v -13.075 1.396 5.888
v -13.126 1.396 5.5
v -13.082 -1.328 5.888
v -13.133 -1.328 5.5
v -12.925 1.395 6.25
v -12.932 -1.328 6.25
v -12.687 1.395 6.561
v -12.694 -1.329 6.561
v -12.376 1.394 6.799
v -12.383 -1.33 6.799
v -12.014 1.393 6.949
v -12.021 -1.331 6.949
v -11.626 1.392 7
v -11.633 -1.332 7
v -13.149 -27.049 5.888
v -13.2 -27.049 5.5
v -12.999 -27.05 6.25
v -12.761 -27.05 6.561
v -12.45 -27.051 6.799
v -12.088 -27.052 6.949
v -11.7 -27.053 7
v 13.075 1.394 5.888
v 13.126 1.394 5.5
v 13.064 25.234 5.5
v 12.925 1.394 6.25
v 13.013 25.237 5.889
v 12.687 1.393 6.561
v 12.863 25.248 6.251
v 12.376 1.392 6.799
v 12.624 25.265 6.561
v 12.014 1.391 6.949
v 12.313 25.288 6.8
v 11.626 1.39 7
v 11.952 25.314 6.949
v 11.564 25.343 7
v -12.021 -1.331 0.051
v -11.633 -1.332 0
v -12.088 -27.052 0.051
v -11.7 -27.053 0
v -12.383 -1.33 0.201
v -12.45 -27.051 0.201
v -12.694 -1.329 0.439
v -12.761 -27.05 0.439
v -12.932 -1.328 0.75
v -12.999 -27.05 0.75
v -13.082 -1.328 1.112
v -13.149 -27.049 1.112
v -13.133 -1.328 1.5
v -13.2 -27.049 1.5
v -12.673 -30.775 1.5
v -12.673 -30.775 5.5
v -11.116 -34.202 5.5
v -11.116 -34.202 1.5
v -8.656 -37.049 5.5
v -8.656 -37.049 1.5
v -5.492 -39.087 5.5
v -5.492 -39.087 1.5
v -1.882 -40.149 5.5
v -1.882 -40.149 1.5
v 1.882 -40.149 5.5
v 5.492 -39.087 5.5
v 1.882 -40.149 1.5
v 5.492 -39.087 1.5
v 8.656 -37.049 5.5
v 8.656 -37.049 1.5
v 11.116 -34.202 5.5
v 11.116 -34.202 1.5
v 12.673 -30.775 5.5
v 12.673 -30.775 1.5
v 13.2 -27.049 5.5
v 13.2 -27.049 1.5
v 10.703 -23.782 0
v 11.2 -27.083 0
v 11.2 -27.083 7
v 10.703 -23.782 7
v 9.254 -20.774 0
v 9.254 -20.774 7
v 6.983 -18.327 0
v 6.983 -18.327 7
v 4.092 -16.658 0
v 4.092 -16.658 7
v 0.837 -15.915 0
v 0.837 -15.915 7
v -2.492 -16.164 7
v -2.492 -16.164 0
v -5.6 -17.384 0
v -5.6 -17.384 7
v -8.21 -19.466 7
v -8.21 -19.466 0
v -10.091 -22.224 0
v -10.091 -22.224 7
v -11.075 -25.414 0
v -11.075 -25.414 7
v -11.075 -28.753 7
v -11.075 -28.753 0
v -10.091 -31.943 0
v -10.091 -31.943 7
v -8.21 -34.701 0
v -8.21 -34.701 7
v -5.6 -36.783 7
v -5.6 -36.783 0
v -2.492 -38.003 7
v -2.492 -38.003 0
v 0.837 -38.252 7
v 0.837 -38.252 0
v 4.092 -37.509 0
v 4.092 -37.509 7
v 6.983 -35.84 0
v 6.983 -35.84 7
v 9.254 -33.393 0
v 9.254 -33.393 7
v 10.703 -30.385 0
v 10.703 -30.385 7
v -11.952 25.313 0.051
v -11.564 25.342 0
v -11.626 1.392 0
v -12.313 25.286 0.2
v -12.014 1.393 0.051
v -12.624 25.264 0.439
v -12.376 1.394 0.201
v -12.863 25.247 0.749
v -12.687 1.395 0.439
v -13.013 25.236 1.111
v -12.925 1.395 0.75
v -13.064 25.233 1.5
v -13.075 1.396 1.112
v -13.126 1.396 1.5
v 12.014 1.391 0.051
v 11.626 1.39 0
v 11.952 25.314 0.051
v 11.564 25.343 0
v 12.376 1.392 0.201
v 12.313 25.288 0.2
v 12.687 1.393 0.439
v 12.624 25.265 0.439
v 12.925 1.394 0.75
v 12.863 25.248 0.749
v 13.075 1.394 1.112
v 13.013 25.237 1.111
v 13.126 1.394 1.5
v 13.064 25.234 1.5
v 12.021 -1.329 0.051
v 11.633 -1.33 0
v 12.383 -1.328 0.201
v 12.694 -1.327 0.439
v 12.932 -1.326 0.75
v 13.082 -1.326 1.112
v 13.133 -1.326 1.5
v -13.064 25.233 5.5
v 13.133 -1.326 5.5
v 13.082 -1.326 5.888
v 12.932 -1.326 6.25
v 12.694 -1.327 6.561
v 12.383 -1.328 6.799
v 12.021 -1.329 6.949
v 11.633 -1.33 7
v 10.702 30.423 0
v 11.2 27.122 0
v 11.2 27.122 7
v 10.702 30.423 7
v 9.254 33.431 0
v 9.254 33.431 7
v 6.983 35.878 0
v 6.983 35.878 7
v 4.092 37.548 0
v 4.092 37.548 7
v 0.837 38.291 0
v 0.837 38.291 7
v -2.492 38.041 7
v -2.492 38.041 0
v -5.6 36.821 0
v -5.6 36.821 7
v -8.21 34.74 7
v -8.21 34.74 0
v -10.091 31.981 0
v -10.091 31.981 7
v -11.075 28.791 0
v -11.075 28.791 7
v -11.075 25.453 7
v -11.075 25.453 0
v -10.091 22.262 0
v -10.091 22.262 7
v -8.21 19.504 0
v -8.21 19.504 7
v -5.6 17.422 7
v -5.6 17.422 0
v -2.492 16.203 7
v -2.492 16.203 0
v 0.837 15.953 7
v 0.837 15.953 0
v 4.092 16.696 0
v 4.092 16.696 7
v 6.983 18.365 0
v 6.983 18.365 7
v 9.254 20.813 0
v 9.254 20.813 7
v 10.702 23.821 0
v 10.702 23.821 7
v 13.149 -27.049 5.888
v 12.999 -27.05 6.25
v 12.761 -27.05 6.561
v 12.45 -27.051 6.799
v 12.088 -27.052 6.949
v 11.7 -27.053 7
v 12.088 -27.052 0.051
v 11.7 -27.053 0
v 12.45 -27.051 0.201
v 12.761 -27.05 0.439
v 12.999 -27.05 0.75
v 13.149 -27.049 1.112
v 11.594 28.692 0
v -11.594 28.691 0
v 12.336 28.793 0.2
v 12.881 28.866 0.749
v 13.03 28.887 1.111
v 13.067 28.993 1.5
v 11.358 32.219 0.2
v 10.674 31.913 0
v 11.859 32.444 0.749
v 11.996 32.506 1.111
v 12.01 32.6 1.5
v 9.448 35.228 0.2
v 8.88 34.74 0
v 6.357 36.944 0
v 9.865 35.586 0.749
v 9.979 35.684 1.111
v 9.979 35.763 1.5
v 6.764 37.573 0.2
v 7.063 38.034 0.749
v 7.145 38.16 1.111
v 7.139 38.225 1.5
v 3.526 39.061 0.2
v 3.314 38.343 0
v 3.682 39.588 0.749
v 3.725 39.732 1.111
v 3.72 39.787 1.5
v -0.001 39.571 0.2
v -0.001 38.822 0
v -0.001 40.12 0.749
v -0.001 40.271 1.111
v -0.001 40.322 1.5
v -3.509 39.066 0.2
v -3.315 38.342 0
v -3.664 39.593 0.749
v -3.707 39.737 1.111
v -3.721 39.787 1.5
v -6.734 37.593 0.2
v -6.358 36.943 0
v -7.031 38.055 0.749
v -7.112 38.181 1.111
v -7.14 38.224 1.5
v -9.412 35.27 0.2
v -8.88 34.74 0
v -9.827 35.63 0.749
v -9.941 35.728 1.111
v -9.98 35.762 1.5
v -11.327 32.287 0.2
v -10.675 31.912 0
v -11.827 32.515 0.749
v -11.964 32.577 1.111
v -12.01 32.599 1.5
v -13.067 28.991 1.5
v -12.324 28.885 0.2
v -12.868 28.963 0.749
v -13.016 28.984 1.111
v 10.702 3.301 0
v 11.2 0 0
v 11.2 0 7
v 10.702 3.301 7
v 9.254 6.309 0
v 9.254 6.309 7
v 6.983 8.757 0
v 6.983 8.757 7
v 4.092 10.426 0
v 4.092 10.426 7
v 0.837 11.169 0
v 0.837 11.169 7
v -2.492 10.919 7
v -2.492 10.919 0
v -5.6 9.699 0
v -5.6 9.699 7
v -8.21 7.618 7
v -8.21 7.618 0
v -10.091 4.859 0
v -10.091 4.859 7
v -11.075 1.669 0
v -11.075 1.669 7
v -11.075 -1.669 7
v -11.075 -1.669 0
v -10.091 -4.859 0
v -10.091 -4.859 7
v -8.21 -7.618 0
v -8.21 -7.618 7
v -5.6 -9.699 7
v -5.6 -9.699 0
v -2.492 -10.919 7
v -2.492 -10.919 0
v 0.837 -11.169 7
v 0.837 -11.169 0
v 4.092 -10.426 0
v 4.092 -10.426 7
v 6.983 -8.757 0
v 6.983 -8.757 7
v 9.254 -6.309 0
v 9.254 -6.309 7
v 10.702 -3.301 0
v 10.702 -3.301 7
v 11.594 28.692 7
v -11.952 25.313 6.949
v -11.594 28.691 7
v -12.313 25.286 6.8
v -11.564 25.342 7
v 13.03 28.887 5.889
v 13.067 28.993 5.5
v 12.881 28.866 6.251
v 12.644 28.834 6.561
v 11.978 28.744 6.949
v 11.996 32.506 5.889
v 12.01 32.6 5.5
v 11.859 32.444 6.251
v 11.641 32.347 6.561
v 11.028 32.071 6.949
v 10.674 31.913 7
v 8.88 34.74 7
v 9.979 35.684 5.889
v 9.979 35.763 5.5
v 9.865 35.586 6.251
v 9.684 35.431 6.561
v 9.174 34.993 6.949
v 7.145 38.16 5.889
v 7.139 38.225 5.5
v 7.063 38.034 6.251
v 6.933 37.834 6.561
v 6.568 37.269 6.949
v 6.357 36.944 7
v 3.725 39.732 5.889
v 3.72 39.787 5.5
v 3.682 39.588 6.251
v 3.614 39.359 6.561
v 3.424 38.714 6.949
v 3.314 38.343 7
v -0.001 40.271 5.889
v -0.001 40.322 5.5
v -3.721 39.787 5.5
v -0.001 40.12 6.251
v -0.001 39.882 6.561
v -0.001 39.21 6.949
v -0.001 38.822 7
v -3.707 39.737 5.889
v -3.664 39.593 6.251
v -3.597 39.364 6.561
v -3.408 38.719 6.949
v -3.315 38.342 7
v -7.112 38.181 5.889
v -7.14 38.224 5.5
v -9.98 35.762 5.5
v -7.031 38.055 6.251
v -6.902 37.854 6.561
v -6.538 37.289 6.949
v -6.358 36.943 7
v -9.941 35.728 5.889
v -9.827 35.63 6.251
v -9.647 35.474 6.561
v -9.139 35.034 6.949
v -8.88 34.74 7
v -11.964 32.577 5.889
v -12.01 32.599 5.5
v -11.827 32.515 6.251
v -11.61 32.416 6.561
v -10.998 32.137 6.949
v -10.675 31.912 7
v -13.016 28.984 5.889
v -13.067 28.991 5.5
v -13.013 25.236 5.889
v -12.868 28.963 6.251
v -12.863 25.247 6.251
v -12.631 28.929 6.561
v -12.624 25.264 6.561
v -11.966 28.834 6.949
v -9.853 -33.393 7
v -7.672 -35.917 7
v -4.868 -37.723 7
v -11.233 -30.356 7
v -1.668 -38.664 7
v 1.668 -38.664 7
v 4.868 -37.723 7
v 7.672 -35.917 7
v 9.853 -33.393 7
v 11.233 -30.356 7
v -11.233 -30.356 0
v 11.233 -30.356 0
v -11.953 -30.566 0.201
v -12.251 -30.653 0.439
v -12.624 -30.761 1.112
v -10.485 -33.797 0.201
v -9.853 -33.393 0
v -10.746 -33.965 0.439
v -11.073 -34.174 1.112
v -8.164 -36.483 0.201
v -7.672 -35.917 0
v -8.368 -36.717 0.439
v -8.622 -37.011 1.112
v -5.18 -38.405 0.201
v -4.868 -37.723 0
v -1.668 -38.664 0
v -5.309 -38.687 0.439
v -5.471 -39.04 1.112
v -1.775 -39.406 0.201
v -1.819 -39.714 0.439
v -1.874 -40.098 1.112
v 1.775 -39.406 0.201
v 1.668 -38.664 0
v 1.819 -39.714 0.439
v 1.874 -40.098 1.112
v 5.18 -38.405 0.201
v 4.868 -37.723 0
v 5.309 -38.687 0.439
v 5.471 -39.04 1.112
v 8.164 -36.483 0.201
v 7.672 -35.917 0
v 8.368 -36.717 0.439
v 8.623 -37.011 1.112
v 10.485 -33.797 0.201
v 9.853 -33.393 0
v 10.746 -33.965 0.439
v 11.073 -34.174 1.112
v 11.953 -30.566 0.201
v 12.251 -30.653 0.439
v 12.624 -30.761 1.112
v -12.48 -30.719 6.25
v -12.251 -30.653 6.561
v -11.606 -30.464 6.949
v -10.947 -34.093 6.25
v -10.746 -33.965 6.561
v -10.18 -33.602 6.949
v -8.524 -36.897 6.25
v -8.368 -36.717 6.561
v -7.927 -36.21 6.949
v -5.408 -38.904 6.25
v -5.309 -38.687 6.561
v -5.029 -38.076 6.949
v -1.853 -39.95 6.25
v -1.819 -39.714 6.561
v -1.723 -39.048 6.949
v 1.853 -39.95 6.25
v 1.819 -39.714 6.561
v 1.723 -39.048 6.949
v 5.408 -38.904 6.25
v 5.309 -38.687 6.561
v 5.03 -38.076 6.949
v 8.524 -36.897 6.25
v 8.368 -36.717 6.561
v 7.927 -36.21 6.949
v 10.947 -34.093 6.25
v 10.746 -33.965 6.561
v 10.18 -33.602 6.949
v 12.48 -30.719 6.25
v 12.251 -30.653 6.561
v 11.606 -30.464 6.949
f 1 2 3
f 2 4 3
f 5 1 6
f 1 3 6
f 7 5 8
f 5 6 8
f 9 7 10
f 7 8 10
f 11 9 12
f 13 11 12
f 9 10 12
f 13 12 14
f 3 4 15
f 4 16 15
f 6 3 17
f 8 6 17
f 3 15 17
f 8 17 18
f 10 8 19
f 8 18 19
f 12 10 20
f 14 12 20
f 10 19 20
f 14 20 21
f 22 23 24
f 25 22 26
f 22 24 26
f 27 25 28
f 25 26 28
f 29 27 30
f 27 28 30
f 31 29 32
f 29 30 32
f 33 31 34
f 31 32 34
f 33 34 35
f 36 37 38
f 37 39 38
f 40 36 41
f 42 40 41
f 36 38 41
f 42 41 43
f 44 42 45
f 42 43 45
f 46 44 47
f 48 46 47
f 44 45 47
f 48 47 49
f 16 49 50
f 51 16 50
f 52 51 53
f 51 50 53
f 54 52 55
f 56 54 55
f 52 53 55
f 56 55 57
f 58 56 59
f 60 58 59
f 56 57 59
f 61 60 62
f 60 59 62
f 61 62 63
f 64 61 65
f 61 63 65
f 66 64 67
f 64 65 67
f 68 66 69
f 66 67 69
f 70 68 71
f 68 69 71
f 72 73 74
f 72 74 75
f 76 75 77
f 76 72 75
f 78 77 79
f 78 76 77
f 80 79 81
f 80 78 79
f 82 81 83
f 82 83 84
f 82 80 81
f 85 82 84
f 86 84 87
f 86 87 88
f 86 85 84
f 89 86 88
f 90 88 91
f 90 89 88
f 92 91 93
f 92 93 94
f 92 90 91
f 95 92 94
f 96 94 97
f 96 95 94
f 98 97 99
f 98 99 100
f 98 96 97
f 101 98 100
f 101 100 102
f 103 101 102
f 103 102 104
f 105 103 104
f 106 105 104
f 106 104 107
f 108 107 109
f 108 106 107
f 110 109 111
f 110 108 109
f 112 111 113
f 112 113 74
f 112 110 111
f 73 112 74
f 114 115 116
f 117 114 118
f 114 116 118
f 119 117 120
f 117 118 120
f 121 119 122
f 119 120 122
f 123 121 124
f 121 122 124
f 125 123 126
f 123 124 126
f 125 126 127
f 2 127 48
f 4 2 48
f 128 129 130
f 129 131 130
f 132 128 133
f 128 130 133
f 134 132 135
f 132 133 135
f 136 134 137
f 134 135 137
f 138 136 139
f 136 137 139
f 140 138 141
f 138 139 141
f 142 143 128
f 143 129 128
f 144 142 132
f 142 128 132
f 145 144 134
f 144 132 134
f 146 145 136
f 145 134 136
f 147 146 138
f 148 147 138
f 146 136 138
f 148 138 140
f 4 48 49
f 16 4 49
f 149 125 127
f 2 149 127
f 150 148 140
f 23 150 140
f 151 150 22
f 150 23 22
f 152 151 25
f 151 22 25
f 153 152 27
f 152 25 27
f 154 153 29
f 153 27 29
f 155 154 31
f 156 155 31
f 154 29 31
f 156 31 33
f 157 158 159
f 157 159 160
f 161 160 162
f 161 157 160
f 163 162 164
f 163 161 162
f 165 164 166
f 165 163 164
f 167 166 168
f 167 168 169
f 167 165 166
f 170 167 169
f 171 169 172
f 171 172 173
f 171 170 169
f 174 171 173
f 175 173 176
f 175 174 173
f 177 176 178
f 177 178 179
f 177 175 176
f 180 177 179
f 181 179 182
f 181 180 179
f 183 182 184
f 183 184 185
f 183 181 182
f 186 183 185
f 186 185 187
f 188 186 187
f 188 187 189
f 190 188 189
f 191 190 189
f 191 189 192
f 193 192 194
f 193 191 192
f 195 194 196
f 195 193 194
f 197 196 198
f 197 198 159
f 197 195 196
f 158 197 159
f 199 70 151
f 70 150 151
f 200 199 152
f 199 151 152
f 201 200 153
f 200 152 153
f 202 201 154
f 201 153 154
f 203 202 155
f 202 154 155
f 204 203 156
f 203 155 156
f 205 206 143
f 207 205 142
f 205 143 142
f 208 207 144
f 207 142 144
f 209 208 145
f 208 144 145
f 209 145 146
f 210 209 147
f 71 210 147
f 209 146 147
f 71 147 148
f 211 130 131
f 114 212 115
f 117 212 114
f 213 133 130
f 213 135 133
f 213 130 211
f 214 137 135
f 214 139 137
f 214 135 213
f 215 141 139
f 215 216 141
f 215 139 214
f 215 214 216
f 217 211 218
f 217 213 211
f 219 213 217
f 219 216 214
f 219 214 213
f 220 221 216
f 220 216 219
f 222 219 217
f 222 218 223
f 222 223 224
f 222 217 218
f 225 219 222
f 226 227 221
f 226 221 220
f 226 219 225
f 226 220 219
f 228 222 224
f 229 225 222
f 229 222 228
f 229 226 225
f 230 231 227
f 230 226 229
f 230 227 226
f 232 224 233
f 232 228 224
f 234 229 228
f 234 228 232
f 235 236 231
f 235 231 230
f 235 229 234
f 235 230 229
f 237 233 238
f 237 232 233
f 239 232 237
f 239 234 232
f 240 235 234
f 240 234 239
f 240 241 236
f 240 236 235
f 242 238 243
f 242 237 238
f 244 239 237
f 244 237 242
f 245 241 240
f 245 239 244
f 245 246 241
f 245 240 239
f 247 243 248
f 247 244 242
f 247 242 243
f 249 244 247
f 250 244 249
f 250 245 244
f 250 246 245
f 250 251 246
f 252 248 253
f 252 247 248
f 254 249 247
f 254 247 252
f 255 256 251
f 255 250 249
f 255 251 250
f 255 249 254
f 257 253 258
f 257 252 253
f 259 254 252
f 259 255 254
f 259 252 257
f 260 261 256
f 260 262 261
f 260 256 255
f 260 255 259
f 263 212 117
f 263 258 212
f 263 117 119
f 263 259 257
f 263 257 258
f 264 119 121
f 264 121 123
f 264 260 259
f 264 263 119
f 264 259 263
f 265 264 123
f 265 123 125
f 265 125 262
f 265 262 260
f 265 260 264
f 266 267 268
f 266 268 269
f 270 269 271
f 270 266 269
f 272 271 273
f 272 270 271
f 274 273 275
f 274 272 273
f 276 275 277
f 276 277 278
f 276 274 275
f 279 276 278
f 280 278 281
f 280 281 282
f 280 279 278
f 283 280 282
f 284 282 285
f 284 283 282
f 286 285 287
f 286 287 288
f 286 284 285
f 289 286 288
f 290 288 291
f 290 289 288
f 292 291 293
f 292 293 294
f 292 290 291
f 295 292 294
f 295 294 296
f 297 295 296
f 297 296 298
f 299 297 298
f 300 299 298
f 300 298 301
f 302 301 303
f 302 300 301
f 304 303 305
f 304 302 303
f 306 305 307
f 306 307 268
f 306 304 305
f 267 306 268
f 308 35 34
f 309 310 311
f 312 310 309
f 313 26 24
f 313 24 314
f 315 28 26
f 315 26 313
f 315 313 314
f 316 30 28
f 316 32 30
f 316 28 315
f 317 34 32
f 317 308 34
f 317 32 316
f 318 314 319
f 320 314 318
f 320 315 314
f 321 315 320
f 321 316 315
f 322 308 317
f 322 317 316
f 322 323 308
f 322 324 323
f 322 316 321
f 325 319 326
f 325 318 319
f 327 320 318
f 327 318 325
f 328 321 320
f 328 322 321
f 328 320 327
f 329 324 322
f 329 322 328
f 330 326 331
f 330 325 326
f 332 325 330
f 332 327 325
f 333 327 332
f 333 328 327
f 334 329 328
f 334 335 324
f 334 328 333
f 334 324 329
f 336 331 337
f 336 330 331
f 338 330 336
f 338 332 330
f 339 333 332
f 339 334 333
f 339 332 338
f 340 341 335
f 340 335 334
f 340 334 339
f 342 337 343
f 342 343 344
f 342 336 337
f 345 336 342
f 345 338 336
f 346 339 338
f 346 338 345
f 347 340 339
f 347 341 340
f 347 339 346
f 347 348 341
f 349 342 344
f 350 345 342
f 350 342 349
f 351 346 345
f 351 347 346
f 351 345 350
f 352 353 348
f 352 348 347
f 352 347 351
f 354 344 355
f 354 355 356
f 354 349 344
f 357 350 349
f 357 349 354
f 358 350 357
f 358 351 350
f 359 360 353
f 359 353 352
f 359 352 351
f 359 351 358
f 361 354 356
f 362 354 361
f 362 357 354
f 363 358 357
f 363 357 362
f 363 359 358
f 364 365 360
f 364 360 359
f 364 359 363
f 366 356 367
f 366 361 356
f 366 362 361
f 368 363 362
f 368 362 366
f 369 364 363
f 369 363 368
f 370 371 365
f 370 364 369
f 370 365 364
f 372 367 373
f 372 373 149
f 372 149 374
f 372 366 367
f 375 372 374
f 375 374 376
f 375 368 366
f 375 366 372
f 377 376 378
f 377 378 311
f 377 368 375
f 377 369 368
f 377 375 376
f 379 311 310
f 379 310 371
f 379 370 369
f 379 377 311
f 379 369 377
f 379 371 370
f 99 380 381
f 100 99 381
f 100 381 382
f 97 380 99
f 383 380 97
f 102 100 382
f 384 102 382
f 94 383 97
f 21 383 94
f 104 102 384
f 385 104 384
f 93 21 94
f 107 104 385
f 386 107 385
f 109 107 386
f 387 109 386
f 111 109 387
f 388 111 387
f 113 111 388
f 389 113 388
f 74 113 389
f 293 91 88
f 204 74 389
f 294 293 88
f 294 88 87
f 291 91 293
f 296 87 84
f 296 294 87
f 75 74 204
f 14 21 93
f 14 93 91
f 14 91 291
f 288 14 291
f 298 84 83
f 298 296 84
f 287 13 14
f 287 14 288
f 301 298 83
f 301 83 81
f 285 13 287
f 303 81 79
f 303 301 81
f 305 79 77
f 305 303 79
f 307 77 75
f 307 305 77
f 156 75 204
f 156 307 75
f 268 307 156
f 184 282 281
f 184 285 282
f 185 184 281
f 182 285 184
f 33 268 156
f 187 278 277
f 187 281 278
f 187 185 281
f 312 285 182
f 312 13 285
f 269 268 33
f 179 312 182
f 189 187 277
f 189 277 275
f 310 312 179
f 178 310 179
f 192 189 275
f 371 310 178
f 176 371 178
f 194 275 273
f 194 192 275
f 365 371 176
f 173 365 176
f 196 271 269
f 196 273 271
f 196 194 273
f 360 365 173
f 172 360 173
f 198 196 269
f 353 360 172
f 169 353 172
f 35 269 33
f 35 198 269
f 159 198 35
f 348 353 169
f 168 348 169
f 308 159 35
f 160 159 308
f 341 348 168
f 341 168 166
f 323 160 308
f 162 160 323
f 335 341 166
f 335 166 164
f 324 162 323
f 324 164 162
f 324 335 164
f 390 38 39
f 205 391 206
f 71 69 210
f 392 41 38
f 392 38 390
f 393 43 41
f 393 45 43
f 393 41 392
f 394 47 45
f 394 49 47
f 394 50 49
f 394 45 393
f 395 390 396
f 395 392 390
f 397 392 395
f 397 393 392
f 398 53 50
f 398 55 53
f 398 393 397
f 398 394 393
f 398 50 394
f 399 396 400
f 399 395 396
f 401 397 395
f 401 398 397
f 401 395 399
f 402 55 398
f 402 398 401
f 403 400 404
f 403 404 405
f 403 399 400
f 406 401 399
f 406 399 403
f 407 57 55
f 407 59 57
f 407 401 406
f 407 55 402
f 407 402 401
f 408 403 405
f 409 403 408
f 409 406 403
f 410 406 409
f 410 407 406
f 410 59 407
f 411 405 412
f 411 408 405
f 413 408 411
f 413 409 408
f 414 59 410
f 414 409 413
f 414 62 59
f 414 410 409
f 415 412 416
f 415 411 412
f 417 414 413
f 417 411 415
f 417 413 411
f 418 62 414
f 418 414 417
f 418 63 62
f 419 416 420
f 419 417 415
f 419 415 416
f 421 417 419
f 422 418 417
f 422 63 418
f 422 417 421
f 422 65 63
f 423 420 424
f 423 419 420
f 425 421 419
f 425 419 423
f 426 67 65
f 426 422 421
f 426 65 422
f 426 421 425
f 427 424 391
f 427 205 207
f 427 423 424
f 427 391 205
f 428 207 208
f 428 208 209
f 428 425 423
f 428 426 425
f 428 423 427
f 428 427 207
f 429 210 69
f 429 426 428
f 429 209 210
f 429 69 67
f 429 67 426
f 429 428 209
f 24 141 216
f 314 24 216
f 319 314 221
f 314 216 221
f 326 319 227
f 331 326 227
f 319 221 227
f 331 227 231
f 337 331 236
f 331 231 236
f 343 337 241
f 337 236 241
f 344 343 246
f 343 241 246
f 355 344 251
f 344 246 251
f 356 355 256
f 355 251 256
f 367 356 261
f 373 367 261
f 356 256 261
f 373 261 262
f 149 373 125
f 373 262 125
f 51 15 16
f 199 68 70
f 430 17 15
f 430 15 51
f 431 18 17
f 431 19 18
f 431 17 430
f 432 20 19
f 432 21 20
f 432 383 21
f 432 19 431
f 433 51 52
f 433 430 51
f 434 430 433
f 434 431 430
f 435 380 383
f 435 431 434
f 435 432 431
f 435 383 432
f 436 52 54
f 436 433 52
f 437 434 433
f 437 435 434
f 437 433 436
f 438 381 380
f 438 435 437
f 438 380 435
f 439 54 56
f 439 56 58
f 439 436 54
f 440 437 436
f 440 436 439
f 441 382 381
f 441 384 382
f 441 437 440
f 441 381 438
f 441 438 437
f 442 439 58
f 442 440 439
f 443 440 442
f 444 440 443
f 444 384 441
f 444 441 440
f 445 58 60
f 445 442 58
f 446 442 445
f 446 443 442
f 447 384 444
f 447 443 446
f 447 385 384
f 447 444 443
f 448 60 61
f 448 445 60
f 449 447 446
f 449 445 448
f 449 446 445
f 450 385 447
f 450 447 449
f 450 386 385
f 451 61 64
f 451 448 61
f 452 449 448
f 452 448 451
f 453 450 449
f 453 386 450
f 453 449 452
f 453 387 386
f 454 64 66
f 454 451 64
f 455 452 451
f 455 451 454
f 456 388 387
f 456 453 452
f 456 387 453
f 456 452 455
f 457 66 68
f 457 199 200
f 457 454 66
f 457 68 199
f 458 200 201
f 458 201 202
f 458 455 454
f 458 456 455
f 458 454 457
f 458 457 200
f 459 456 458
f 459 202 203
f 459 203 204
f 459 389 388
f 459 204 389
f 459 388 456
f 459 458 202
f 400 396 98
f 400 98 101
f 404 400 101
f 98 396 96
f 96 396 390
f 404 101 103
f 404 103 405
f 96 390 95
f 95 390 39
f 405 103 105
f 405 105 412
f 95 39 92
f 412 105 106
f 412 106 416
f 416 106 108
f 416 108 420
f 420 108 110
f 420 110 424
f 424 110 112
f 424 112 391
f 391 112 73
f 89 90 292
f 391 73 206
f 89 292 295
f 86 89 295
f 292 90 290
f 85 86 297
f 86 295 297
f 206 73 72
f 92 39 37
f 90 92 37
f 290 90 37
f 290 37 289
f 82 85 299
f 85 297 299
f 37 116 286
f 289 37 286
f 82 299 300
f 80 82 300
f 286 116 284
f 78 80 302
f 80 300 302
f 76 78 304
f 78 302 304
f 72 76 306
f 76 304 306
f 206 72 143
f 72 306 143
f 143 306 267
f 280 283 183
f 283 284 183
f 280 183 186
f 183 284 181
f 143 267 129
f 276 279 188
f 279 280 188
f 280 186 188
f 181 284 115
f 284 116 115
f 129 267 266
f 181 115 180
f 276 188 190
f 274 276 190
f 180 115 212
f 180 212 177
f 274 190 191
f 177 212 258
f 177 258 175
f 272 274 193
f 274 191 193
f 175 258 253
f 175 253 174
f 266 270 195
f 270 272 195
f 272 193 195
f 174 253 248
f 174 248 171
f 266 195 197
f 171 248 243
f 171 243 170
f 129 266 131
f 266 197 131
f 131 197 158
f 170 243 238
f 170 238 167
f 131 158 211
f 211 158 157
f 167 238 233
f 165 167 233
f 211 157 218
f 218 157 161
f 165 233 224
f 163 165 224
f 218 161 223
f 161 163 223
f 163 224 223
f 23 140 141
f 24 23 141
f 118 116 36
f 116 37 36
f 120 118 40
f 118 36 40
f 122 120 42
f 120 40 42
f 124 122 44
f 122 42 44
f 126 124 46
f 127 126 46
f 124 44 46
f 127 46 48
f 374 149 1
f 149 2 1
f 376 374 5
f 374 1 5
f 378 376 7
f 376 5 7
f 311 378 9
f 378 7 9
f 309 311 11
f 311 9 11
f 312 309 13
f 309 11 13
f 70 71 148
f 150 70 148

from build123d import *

# Parameters (mm, degrees)
F0_R     = 11.2
F2_DEPTH = 7
F3_R     = 1.5
F4_R     = 1.5


with BuildPart() as f2:
    # F0 (on Top) → F2 (new body)
    with BuildSketch(Plane.XY):
        with BuildLine():
            Line((13.200049, -27.049193), (13.133245, -1.325845))
            Line((13.133245, -1.325845), (13.126182, 1.394041))
            Line((13.126182, 1.394041), (13.064269, 25.233856))
            ThreePointArc((13.064269, 25.233856), (-0.000644, 40.321941), (-13.064085, 25.232581))
            Line((-13.064085, 25.232581), (-13.125989, 1.395851))
            Line((-13.125989, 1.395851), (-13.133062, -1.327656))
            Line((-13.133062, -1.327656), (-13.199862, -27.049193))
            ThreePointArc((-13.199862, -27.049193), (9.4e-05, -40.283473), (13.200049, -27.049193))
        make_face()
        Circle(F0_R, mode=Mode.SUBTRACT)
        with Locations((9.4e-05, -27.083473)):
            Circle(F0_R, mode=Mode.SUBTRACT)
        with Locations((0, 27.121941)):
            Circle(F0_R, mode=Mode.SUBTRACT)
    extrude(amount=F2_DEPTH)

    # F3
    f3_edges = [f2.edges().sort_by_distance(p)[0] for p in [
        (13.132159, -0.907668, 7),
        (9.4e-05, -40.283473, 7),
        (-13.131973, -0.908306, 7),
        (-0.000644, 40.321941, 7),
    ]]
    fillet(f3_edges, radius=F3_R)

    # F4
    f4_edges = [f2.edges().sort_by_distance(p)[0] for p in [
        (-0.000644, 40.321941, 0),
        (13.132159, -0.907668, 0),
        (-13.131973, -0.908306, 0),
        (9.4e-05, -40.283473, 0),
    ]]
    fillet(f4_edges, radius=F4_R)


solid = f2.part
